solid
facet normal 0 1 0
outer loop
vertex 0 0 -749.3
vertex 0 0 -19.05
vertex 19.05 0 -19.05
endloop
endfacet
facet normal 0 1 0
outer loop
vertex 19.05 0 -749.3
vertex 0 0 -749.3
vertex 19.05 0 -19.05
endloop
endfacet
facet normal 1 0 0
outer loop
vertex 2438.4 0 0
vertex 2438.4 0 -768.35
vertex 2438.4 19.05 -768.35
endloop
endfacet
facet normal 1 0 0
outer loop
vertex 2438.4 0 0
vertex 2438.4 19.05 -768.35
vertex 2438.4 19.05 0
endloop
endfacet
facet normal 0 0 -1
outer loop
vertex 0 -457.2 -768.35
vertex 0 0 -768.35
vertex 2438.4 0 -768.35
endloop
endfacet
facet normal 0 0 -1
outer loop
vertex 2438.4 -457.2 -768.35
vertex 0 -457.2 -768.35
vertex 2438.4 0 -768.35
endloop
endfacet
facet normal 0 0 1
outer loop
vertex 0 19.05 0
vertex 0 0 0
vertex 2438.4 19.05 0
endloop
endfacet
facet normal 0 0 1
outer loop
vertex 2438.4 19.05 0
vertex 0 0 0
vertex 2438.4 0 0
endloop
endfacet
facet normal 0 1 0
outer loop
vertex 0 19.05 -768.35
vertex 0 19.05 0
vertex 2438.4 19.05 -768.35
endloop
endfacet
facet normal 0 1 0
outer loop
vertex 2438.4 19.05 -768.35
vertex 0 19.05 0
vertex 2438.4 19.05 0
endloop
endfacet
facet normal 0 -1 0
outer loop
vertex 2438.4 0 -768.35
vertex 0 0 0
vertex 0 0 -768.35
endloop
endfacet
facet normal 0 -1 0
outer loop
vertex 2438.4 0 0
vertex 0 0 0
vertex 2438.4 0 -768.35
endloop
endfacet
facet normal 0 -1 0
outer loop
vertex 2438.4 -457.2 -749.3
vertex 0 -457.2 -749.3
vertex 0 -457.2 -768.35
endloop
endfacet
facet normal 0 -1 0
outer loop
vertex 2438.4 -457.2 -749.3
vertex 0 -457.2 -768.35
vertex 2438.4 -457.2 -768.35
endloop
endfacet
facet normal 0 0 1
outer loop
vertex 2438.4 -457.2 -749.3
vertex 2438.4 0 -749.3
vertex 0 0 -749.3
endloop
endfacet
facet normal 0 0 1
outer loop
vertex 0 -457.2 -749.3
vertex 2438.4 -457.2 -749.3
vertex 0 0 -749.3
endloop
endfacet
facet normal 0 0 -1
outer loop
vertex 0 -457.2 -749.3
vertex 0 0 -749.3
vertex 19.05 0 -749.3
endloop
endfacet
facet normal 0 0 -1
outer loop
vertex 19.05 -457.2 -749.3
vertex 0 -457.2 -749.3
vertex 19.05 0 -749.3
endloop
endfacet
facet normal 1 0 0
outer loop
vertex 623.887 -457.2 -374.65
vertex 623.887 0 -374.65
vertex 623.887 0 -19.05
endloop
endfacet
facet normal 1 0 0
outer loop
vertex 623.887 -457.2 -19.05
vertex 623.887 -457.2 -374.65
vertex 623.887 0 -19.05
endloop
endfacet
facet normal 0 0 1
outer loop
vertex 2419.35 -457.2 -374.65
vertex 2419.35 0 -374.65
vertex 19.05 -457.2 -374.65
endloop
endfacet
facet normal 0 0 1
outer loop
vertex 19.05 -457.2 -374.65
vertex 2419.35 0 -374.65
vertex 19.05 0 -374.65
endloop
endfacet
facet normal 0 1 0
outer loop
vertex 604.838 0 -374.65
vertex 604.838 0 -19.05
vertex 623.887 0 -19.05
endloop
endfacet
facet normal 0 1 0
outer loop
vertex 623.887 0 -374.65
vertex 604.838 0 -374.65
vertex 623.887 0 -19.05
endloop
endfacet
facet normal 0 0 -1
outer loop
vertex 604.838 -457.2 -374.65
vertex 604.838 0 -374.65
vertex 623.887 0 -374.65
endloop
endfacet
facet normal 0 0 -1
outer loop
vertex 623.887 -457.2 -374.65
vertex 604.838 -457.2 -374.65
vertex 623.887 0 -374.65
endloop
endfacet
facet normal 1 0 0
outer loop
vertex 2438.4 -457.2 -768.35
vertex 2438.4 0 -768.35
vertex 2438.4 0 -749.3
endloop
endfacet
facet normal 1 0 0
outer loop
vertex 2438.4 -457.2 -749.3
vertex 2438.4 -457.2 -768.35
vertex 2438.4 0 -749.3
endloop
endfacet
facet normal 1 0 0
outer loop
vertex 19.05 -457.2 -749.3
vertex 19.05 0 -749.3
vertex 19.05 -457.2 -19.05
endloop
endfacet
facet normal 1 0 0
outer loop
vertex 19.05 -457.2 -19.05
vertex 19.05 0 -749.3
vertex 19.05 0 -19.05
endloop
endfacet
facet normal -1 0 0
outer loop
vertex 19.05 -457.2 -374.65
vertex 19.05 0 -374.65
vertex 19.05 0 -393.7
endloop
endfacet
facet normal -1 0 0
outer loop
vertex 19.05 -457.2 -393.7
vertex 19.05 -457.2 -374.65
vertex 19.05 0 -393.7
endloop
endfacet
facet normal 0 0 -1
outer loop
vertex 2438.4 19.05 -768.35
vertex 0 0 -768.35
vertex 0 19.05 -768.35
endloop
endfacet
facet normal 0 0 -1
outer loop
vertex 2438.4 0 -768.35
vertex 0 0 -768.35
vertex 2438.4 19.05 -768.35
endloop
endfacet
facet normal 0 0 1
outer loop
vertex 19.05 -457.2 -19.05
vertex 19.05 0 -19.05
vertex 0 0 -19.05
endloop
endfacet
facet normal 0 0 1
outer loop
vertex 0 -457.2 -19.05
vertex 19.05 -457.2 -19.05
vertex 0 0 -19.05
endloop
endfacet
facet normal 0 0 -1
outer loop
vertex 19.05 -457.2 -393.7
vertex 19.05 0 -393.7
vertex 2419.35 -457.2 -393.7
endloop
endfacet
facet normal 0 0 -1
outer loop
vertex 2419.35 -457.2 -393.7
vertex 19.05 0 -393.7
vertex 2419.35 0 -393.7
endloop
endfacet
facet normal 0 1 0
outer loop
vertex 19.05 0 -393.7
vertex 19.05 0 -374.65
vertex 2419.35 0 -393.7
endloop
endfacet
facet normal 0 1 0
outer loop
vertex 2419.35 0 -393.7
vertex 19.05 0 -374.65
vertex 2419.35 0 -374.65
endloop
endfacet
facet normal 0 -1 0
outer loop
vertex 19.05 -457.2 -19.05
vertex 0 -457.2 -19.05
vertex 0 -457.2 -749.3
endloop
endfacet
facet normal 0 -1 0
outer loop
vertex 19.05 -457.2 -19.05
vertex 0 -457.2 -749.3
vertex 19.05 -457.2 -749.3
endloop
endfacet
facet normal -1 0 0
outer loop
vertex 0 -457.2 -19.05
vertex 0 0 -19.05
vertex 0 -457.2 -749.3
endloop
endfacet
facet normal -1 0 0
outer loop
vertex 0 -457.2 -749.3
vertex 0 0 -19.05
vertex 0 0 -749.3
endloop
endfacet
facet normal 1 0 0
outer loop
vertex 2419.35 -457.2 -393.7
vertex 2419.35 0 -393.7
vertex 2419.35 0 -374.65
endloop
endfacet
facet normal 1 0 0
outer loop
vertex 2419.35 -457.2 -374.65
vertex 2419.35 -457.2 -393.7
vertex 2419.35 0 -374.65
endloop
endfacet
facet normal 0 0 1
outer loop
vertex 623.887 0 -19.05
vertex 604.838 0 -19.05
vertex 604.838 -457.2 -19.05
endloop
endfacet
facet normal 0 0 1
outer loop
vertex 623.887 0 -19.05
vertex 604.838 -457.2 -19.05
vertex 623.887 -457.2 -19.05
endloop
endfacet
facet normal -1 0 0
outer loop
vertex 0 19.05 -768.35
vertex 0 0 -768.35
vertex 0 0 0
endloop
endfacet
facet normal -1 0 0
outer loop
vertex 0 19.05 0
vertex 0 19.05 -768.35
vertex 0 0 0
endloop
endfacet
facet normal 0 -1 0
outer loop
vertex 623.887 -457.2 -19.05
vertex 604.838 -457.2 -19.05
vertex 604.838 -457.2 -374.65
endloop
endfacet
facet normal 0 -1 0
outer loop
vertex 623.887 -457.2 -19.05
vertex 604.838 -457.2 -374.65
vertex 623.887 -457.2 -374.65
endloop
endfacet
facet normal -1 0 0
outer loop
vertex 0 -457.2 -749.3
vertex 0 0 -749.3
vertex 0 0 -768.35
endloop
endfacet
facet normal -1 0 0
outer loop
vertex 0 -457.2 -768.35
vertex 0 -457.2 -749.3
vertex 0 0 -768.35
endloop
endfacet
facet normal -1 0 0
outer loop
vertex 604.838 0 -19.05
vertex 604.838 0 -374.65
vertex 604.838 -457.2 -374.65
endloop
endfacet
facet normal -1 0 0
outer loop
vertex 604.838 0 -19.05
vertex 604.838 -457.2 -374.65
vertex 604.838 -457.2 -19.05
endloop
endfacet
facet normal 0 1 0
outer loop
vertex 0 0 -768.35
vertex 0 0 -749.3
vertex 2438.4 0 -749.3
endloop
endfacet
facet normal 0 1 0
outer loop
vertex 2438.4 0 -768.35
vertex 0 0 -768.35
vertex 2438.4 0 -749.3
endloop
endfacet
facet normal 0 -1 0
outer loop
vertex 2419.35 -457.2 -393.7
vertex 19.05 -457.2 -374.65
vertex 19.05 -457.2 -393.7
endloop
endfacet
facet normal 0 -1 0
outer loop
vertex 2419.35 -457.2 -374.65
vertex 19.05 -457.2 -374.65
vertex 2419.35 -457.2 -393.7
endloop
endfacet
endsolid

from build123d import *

# Parameters (mm, degrees)
F1_DEPTH = 457.2
F2_DEPTH = 457.2
F3_DEPTH = 457.2
F0_W     = 19.05
F0_H     = 355.6
F4_DEPTH = 457.2
F5_W     = 2438.4
F5_H     = 768.35
F6_DEPTH = 19.05


with BuildPart() as f1:
    # F0 (on Front) → F1 (new body)
    with BuildSketch(Plane.XZ):
        Polygon((19.05, -749.3), (0, -749.3), (0, -768.35), (2438.4, -768.35), (2438.4, -749.3), (2419.35, -749.3), (1631.95, -749.3), (1612.9, -749.3), (825.5, -749.3), (806.45, -749.3), align=None)
    extrude(amount=F1_DEPTH)


with BuildPart() as f2:
    # F0 (on Front) → F2 (new body)
    with BuildSketch(Plane.XZ):
        Polygon((19.05, -19.05), (0, -19.05), (0, -749.3), (19.05, -749.3), (19.05, -393.7), (19.05, -374.65), align=None)
    extrude(amount=F2_DEPTH)


with BuildPart() as f3:
    # F0 (on Front) → F3 (new body)
    with BuildSketch(Plane.XZ):
        Polygon((604.8375, -374.65), (19.05, -374.65), (19.05, -393.7), (806.45, -393.7), (825.5, -393.7), (1612.9, -393.7), (1631.95, -393.7), (2419.35, -393.7), (2419.35, -374.65), (1833.5625, -374.65), (1814.5125, -374.65), (1228.725, -374.65), (1209.675, -374.65), (623.8875, -374.65), align=None)
    extrude(amount=F3_DEPTH)


with BuildPart() as f4:
    # F0 (on Front) → F4 (new body)
    with BuildSketch(Plane.XZ):
        with Locations((614.3625, -196.85)):
            Rectangle(F0_W, F0_H)
    extrude(amount=F4_DEPTH)


with BuildPart() as f6:
    # F5 (on face) → F6 (new body)
    with BuildSketch(Plane.XZ):
        with Locations((1219.2, -384.175)):
            Rectangle(F5_W, F5_H)
    extrude(amount=-F6_DEPTH)


solid = Compound([f1.part, f2.part, f3.part, f4.part, f6.part])
